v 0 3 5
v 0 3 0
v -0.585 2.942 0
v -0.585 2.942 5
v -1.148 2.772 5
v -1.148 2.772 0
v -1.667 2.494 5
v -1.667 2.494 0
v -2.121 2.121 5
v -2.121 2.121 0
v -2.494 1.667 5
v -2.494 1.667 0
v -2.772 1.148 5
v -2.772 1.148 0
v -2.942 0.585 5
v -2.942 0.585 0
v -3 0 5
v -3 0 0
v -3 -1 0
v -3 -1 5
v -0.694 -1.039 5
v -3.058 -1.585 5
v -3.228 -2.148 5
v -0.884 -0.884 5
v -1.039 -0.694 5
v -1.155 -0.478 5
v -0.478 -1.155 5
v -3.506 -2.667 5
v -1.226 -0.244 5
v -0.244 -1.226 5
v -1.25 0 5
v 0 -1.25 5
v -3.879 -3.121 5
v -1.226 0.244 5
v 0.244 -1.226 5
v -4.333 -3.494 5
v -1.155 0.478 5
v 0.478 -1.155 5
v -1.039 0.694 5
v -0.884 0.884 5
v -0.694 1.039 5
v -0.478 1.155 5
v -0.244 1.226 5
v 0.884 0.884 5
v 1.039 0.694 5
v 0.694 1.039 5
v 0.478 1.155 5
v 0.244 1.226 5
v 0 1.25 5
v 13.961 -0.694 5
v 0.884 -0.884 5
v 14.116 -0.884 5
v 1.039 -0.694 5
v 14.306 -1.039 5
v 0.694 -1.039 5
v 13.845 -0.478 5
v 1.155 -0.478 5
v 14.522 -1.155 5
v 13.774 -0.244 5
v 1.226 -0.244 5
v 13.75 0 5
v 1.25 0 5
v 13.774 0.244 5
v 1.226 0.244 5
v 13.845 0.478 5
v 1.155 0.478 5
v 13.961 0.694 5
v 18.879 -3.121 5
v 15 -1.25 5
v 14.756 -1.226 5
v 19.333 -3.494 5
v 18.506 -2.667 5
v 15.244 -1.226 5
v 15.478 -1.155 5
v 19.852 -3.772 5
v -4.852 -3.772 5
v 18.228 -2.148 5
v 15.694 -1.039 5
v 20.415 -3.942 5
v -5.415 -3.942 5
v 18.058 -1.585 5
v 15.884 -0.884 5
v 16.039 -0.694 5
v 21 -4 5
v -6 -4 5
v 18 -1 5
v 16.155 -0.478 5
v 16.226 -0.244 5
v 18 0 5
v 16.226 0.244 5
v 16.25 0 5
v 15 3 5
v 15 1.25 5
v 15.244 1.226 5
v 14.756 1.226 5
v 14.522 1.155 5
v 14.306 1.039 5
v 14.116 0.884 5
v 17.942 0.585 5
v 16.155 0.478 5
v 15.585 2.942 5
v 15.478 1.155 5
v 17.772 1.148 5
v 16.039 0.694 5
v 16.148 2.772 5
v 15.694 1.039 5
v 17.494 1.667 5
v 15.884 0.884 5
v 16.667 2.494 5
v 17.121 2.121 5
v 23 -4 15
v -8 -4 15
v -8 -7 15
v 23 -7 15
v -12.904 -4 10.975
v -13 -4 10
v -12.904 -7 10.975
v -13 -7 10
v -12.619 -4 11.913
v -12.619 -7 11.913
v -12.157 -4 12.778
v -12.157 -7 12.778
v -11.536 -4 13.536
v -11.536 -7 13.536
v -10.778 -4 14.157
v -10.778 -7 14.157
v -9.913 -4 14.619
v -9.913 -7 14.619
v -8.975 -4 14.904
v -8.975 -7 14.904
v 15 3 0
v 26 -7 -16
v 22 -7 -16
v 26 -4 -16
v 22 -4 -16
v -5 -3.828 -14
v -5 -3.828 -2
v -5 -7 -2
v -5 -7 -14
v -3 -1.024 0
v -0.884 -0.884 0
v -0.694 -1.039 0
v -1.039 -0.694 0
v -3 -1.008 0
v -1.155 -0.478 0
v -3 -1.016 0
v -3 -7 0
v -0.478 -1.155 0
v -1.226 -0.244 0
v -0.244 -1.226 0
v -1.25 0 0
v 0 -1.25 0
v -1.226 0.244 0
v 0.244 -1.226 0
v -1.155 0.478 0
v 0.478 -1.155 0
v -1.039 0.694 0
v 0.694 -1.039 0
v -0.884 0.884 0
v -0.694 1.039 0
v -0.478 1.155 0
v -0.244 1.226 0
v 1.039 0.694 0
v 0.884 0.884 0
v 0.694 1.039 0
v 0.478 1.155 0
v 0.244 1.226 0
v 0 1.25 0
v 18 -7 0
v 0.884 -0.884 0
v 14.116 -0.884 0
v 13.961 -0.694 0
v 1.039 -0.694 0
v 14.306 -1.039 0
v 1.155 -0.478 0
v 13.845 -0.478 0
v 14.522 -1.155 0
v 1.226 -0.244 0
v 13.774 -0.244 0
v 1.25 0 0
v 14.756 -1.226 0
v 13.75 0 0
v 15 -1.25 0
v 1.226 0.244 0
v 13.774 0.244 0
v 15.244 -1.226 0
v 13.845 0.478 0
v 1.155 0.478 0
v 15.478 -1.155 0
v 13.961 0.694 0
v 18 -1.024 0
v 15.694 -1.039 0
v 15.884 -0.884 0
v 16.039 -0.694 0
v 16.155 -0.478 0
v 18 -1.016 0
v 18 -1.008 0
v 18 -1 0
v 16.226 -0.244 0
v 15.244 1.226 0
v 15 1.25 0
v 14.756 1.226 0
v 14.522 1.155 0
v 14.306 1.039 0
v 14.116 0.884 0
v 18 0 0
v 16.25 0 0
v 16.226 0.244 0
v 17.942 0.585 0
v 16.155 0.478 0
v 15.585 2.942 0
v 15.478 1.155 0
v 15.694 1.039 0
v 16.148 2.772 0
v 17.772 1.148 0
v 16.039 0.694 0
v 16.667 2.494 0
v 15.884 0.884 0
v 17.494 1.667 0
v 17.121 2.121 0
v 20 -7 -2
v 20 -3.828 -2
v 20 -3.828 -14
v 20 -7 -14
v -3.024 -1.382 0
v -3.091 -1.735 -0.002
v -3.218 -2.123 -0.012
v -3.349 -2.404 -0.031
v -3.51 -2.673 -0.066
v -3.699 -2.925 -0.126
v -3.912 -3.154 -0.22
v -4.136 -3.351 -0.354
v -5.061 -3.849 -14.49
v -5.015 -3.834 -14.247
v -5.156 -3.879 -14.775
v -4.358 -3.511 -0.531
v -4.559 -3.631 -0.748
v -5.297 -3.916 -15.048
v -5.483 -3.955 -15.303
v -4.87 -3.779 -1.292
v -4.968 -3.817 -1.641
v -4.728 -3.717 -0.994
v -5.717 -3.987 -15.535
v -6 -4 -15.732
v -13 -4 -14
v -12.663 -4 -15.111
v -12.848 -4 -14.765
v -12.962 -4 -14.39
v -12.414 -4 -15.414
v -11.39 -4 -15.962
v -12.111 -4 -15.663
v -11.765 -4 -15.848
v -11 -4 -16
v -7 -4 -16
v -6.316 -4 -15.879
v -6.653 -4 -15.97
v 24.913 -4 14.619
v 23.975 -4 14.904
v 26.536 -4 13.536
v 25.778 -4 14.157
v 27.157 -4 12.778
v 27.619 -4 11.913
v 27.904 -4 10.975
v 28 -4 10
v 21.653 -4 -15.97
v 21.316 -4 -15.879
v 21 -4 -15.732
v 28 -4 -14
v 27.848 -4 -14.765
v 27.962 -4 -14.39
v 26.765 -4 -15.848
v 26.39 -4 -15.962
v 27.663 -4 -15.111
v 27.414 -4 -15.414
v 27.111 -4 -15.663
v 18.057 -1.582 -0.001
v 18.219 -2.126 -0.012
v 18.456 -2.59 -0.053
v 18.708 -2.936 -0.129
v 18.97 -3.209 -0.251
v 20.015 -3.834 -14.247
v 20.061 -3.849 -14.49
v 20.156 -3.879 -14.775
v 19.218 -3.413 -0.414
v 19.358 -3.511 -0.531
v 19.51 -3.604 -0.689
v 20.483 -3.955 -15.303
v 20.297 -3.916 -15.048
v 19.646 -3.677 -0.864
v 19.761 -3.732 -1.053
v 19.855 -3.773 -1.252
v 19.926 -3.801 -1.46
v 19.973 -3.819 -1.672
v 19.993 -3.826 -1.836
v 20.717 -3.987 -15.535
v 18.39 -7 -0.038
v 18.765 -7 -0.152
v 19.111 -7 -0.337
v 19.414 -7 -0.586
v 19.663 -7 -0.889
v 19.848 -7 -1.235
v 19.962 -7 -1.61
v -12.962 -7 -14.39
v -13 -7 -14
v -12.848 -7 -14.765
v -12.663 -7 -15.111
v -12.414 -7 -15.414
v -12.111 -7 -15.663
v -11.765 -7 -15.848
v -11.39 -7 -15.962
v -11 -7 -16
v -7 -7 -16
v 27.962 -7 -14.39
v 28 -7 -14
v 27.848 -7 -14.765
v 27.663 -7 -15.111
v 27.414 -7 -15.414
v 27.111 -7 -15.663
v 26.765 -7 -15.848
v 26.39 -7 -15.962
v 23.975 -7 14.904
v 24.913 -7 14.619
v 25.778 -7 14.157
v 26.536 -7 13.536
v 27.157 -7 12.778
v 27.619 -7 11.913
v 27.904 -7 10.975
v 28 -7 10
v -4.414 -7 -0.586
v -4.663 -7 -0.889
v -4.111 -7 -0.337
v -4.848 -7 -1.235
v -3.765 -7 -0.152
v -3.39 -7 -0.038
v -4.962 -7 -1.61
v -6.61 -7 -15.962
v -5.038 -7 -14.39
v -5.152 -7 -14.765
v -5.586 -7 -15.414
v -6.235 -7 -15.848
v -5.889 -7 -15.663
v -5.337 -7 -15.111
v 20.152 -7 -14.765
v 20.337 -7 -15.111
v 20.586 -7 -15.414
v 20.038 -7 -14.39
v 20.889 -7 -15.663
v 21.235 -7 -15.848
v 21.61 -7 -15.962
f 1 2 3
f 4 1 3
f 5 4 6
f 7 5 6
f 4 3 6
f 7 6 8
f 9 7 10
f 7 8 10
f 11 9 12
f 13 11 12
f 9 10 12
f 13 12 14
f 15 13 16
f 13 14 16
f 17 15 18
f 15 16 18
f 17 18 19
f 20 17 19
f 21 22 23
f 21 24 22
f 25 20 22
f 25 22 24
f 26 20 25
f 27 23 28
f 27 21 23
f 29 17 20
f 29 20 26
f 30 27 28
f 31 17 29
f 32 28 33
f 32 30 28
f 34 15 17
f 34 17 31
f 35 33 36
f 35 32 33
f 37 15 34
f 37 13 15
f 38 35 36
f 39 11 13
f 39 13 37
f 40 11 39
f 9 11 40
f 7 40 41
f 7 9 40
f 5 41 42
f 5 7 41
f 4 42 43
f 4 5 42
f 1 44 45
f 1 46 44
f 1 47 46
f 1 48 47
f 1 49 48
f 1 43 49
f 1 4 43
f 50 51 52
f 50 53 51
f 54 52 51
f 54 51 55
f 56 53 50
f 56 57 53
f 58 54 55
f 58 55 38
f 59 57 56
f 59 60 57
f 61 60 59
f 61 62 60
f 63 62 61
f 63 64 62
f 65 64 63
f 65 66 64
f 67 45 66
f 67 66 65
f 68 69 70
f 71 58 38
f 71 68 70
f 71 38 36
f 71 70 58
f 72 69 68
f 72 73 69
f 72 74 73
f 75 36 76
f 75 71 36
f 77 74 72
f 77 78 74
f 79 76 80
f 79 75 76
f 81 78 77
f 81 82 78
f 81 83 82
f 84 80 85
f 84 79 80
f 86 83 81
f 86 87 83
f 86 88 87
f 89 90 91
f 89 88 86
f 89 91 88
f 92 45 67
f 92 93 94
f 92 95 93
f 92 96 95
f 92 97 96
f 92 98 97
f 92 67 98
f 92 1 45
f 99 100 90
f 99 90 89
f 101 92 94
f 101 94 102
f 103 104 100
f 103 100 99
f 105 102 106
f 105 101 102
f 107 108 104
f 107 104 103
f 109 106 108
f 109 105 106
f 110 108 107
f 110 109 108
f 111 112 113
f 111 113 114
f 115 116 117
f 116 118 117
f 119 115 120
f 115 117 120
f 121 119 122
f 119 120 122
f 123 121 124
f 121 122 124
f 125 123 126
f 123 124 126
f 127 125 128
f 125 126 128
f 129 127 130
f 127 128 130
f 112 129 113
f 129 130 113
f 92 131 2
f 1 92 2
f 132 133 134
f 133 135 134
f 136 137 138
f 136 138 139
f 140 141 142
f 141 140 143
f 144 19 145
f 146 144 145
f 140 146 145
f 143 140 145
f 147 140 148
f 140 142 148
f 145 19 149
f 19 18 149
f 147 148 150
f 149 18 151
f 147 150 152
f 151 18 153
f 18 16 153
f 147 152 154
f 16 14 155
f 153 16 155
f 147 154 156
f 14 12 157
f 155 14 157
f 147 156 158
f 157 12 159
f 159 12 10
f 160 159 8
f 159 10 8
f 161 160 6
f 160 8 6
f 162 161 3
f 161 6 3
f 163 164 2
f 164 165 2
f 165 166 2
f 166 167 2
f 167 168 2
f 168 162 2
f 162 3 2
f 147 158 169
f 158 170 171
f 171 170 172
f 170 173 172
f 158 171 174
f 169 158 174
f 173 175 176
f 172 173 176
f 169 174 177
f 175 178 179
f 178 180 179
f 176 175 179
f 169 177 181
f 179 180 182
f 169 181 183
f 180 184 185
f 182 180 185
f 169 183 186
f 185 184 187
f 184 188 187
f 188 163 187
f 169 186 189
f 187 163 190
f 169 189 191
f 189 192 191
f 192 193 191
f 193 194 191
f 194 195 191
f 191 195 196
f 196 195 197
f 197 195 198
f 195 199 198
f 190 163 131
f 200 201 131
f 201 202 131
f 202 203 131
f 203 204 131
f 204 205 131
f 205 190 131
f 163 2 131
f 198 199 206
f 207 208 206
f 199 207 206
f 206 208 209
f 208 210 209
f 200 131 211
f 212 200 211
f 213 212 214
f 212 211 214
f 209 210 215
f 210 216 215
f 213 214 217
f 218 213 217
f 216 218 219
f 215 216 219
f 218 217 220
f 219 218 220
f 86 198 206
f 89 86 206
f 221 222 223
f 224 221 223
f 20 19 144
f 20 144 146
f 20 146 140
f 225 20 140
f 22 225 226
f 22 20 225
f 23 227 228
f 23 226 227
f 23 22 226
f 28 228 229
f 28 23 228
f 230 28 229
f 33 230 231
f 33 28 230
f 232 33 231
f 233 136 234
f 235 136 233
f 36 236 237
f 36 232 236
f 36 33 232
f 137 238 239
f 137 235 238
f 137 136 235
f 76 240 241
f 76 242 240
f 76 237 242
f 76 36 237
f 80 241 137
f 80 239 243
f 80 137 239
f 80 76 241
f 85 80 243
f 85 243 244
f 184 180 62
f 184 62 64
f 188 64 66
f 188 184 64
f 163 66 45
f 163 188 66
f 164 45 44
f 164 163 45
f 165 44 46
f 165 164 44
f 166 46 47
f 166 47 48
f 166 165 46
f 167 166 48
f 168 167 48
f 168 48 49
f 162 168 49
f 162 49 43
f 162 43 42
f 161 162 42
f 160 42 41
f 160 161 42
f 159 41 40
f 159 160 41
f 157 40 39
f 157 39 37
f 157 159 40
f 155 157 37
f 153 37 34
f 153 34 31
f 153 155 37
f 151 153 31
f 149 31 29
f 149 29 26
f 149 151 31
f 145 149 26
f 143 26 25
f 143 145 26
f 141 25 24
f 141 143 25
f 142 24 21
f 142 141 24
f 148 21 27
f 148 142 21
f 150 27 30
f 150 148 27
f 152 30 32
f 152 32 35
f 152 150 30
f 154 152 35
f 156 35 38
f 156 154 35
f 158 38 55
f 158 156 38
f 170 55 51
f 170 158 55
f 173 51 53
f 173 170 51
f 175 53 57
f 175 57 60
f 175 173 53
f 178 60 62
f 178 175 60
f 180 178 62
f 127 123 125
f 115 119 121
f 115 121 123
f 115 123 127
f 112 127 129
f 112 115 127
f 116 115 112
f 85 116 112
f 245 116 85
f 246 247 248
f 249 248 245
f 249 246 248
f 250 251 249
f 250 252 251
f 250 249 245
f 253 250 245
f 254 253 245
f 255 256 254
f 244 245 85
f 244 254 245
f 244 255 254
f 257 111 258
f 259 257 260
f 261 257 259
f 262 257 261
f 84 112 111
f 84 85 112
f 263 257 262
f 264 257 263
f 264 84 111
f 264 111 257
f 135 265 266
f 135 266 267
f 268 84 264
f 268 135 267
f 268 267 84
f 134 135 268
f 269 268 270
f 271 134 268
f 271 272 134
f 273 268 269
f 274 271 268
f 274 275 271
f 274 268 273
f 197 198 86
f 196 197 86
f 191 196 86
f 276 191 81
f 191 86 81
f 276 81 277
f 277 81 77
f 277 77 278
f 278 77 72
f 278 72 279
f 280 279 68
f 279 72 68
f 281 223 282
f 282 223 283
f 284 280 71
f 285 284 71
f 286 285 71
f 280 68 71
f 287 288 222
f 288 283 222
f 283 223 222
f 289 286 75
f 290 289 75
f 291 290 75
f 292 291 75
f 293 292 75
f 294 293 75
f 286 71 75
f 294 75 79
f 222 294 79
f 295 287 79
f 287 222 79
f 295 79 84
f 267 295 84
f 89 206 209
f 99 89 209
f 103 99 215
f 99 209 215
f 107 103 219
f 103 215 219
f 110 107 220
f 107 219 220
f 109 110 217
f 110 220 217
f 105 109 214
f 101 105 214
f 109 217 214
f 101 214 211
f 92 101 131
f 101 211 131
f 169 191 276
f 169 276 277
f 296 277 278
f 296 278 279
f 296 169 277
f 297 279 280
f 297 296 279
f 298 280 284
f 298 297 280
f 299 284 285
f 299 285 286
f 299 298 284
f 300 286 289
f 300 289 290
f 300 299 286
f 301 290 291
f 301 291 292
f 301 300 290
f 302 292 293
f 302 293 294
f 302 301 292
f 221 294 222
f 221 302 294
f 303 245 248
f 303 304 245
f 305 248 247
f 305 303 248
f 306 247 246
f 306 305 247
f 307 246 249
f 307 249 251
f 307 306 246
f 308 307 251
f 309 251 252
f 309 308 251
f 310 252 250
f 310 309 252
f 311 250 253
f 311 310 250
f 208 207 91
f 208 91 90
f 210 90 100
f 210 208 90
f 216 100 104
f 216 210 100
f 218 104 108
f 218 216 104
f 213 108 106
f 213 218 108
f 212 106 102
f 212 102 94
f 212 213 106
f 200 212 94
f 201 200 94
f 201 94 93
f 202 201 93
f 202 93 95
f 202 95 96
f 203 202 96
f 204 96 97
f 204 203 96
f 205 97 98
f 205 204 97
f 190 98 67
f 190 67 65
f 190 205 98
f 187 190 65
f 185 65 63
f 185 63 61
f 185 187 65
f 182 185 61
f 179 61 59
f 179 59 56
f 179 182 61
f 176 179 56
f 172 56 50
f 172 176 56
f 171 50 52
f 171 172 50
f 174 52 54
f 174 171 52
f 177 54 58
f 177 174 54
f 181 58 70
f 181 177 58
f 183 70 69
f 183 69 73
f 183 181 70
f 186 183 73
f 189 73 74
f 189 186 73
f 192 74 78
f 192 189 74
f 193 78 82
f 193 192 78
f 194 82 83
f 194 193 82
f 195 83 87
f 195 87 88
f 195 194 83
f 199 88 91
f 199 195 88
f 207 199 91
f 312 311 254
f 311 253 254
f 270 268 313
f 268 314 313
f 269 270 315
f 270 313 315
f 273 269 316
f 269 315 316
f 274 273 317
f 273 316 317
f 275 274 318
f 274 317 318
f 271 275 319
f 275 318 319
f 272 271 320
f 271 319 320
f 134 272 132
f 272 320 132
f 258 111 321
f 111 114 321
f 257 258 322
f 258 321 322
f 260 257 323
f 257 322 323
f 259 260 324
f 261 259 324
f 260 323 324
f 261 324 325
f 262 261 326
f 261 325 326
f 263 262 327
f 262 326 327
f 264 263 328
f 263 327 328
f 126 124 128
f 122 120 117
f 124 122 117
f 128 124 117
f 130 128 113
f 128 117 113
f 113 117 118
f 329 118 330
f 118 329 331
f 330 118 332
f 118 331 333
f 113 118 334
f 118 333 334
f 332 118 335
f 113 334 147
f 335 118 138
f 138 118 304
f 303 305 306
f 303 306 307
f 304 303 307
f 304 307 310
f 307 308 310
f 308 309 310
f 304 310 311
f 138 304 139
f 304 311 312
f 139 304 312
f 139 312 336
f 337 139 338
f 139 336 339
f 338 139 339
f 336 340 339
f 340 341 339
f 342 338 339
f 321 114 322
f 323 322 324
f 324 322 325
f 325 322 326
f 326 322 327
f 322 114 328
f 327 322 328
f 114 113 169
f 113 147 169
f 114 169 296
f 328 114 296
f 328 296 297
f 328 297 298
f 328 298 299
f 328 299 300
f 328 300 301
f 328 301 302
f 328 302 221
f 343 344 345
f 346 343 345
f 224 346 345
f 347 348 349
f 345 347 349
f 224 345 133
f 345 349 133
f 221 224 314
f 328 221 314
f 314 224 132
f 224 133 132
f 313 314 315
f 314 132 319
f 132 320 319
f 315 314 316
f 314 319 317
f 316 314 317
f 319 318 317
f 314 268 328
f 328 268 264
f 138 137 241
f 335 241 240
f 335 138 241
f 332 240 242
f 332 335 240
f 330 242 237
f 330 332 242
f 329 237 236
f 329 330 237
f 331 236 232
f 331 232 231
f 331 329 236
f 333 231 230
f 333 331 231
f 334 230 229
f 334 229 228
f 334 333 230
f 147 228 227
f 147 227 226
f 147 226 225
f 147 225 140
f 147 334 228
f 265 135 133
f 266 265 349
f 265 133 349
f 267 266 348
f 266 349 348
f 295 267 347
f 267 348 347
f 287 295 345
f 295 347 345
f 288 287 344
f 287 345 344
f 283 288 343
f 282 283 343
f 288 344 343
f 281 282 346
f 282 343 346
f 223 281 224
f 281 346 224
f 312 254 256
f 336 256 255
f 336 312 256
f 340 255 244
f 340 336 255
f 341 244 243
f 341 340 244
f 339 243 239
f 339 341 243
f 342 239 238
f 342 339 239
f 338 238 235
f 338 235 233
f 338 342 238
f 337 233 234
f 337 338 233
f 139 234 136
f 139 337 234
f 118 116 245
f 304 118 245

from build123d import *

# Parameters (mm, degrees)
SKETCH_1_R      = 1.25
EXTRUDE_1_DEPTH = 5
SKETCH_2_W      = 41
SKETCH_2_H      = 15
EXTRUDE_2_DEPTH = 3
SKETCH_4_W      = 8
SKETCH_4_H      = 16
EXTRUDE_3_DEPTH = 3
FILLET_1_R      = 3
FILLET_2_R      = 5
FILLET_3_R      = 2


with BuildPart() as part:
    # ｽｹｯﾁ1 → ﾎﾞｽ - 押し出し1 (new body)
    with BuildSketch(Plane.XY):
        with BuildLine():
            Line((-3, -4), (18, -4))
            Line((18, -4), (18, 0))
            ThreePointArc((18, 0), (17.121320344, 2.121320344), (15, 3))
            Line((15, 3), (0, 3))
            ThreePointArc((0, 3), (-2.121320344, 2.121320344), (-3, 0))
            Line((-3, 0), (-3, -4))
        make_face()
        Circle(SKETCH_1_R, mode=Mode.SUBTRACT)
        with Locations((15, 0)):
            Circle(SKETCH_1_R, mode=Mode.SUBTRACT)
    extrude(amount=EXTRUDE_1_DEPTH)

    # ｽｹｯﾁ2 → ﾎﾞｽ - 押し出し2 (add)
    with BuildSketch(Plane.XZ.offset(4)):
        with Locations((7.5, 7.5)):
            Rectangle(SKETCH_2_W, SKETCH_2_H)
    extrude(amount=EXTRUDE_2_DEPTH)

    # ｽｹｯﾁ4 → ﾎﾞｽ - 押し出し3 (add)
    with BuildSketch(Plane(origin=(0, -4, 0), x_dir=(1, 0, 0), z_dir=(0, 1, 0))):
        with Locations((-9, 8)):
            Rectangle(SKETCH_4_W, SKETCH_4_H)
        with Locations((24, 8)):
            Rectangle(SKETCH_4_W, SKETCH_4_H)
    extrude(amount=-EXTRUDE_3_DEPTH)

    # ﾌｨﾚｯﾄ1
    fillet_1_edges = [part.edges().sort_by_distance(p)[0] for p in [
        (-3, -4, 2.5),
        (18, -4, 2.5),
    ]]
    fillet(fillet_1_edges, radius=FILLET_1_R)

    # ﾌｨﾚｯﾄ2
    fillet_2_edges = [part.edges().sort_by_distance(p)[0] for p in [
        (-13, -5.5, 15),
        (28, -5.5, 15),
    ]]
    fillet(fillet_2_edges, radius=FILLET_2_R)

    # ﾌｨﾚｯﾄ3
    fillet_3_edges = [part.edges().sort_by_distance(p)[0] for p in [
        (28, -5.5, -16),
        (20, -5.414213562, -16),
        (20, -5.414213562, 0),
        (-5, -5.414213562, 0),
        (-5, -5.414213562, -16),
        (-13, -5.5, -16),
    ]]
    fillet(fillet_3_edges, radius=FILLET_3_R - 0.0001)  # a hair under: the kernel refuses the full size


solid = part.part
